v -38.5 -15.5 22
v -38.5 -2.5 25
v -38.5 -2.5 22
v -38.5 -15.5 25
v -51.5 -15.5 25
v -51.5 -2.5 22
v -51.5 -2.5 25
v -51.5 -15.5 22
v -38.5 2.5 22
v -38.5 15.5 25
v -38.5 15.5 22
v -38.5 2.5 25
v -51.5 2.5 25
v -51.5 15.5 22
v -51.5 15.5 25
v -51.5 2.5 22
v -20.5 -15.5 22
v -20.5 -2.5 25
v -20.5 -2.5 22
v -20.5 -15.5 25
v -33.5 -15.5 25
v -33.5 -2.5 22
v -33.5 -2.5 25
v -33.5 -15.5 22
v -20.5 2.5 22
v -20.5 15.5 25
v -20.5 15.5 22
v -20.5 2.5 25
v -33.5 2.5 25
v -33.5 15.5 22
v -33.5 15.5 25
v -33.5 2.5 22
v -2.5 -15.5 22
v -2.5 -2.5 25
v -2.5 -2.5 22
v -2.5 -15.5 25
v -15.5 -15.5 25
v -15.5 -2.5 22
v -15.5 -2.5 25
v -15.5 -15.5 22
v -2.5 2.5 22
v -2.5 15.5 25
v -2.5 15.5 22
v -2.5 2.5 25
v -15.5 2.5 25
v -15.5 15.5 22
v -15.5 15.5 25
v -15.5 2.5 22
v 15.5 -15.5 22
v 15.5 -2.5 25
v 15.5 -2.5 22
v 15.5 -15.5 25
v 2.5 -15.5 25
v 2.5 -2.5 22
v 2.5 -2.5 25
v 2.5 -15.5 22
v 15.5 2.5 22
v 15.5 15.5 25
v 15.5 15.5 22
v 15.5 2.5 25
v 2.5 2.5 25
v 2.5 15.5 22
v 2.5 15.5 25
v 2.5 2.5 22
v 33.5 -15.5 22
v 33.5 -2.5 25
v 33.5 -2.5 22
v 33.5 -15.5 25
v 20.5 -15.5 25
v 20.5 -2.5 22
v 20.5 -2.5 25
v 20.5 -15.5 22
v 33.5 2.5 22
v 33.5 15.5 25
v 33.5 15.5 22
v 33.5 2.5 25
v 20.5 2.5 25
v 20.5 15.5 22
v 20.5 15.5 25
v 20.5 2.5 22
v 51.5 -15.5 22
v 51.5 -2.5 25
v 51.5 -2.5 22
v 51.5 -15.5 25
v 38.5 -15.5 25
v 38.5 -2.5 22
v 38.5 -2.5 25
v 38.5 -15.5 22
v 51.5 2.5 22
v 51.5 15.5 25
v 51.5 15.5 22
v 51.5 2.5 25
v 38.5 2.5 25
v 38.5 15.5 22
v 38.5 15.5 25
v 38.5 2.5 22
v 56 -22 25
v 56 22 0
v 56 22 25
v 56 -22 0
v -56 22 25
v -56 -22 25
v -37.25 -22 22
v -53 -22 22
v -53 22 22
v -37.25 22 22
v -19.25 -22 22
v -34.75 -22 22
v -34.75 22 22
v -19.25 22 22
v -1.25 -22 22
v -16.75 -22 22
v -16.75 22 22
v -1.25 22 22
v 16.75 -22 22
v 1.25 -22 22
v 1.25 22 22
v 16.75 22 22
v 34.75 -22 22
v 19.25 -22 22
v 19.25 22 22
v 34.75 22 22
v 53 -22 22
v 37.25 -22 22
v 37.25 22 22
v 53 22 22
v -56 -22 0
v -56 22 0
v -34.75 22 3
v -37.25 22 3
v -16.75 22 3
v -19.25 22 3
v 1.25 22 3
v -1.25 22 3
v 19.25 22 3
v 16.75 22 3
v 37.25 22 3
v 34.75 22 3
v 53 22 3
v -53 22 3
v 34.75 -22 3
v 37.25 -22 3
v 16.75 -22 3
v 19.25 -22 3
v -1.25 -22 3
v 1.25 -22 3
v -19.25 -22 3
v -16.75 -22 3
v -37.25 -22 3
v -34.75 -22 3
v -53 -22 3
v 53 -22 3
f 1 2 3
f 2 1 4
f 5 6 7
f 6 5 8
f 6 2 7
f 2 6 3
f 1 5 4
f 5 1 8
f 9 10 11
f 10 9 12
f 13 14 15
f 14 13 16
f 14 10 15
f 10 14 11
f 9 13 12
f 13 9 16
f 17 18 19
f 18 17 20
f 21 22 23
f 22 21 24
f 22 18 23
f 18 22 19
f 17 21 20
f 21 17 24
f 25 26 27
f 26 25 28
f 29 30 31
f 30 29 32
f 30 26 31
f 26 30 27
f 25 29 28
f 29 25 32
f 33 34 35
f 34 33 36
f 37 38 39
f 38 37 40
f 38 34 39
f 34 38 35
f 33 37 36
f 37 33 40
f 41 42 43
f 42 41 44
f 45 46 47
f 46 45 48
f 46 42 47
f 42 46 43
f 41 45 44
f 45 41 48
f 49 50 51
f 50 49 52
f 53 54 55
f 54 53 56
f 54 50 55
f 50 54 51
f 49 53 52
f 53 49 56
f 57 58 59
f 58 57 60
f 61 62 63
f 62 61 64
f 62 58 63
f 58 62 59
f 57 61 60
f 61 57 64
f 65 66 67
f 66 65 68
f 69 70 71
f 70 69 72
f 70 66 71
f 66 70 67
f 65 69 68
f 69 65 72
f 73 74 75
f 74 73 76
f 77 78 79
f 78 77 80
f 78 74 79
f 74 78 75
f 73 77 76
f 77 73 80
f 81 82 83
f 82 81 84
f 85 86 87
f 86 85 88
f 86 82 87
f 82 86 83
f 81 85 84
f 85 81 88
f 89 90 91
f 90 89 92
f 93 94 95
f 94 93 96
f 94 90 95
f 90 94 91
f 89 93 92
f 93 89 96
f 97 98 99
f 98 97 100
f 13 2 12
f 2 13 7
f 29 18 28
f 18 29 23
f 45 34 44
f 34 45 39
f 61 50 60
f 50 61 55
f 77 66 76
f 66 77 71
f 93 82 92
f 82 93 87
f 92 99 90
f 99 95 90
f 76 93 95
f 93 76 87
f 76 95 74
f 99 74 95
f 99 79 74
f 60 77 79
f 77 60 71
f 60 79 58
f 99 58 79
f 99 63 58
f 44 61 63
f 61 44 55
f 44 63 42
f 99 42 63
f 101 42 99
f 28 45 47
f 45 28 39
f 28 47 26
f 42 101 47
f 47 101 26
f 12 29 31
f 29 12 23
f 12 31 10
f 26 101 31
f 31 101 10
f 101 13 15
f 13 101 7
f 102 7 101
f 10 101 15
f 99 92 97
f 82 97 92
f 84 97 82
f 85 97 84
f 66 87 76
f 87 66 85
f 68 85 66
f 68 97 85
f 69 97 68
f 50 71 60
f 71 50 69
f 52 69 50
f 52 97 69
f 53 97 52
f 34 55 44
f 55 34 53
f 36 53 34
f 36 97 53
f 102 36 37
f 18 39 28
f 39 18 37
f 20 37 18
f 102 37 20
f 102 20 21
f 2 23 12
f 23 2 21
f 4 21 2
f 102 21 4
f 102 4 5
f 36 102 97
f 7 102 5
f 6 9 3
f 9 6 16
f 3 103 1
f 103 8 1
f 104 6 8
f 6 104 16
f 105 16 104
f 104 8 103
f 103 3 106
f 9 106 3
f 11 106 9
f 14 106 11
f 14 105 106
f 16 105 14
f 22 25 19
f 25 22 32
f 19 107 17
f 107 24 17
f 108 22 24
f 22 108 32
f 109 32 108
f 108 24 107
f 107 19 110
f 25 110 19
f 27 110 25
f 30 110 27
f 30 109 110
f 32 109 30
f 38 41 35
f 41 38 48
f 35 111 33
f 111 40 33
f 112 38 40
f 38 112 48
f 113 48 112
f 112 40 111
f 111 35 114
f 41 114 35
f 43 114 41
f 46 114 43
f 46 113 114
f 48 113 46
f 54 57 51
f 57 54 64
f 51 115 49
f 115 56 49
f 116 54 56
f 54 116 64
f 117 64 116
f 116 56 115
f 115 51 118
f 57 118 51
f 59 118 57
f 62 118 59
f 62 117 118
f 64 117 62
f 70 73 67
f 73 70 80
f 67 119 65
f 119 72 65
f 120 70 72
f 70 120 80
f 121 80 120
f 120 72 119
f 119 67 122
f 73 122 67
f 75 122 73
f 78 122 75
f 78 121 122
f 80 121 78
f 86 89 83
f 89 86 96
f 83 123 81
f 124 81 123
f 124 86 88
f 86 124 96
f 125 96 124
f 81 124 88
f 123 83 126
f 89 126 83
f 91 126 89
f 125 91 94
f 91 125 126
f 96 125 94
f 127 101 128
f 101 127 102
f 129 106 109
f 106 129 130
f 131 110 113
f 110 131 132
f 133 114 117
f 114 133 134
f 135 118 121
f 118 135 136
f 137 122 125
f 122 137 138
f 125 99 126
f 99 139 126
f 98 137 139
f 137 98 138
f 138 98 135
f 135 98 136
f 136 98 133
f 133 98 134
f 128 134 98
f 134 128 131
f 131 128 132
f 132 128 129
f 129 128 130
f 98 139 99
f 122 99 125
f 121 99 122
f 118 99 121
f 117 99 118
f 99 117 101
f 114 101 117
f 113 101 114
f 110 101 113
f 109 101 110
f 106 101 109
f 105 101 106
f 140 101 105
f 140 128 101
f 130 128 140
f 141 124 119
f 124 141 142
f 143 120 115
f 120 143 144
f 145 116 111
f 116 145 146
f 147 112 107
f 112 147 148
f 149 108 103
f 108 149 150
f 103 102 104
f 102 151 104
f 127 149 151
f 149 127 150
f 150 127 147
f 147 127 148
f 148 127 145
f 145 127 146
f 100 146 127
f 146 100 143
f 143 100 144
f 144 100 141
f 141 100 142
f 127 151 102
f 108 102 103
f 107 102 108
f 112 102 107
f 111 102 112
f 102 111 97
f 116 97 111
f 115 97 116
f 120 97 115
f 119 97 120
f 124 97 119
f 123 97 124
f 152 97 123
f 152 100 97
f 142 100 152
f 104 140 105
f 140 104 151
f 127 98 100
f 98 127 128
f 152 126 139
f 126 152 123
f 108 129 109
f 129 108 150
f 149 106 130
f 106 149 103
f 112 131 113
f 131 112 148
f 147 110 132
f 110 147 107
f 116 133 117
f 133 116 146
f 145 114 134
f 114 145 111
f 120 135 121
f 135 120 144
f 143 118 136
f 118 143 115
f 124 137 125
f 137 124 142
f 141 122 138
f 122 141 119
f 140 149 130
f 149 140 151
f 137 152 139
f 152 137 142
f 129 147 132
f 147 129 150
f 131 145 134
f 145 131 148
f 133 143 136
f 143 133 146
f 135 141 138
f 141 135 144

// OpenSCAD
// 12-cuvette rack, printed standing on its base (z = 0 to 25)
$fn = 64;

// ---- overall envelope ----
base_w   = 112;   // X size of base & deck plates
base_d   = 44;    // Y size of base & deck plates
base_t   = 3;     // base plate thickness (z 0..3)
deck_t   = 3;     // deck plate thickness (z 22..25)
wall_h   = 25;    // total height of end walls & ribs (z 0..25)

// ---- end walls (flush with short ends, 3 mm thick) ----
ew_t     = 3;     // end wall thickness
ew_x     = base_w/2 - ew_t/2;   // centre x of each end wall (±54.5)

// ---- internal ribs (2.5 mm thick, centred at given x) ----
rib_t    = 2.5;
rib_x    = [-36, -18, 0, 18, 36];

// ---- deck through-holes (13 x 13 mm, sides parallel to edges) ----
hole_s   = 13;    // square hole side
pitch    = 18;    // centre-to-centre spacing in X and Y
n_x      = 6;     // holes per row (along X)
n_y      = 2;     // number of rows (along Y)

// ---- base plate (z 0..3) ----
translate([0, 0, base_t/2])
    cube([base_w, base_d, base_t], center = true);

// ---- deck plate (z 22..25) with 12 square through-holes ----
translate([0, 0, 22 + deck_t/2])
    difference() {
        cube([base_w, base_d, deck_t], center = true);
        for (i = [0 : n_x - 1])
        for (j = [0 : n_y - 1]) {
            hx = (i - (n_x - 1)/2) * pitch;   // centred on deck in X
            hy = (j - (n_y - 1)/2) * pitch;   // centred on deck in Y
            translate([hx, hy, 0])
                cube([hole_s, hole_s, deck_t + 2], center = true); // 1 mm past each face
        }
    }

// ---- two 3 mm end walls (z 0..25) ----
for (sx = [-1, 1]) {
    translate([sx * ew_x, 0, wall_h/2])
        cube([ew_t, base_d, wall_h], center = true);
}

// ---- five 2.5 mm internal ribs (z 0..25) ----
for (rx = rib_x) {
    translate([rx, 0, wall_h/2])
        cube([rib_t, base_d, wall_h], center = true);
}
